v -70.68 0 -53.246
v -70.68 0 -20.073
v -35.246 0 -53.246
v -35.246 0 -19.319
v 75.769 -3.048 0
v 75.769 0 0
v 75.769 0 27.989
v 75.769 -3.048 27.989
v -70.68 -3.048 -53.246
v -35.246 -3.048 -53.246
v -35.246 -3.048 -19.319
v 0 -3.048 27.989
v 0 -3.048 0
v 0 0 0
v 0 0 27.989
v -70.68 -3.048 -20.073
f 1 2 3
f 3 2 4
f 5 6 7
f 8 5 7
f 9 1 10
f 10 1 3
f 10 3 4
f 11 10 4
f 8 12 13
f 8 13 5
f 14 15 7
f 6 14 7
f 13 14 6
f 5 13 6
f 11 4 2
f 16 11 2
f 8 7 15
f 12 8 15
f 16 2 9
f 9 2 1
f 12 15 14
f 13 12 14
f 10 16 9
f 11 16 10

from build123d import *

# Parameters (mm, degrees)
F0_W     = 37.884593
F0_H     = 13.994683
F0_H_2   = 13.994682
F1_DEPTH = 3.048
F3_DEPTH = 3.048


with BuildPart() as f1:
    # F0 (on Front) → F1 (new body)
    with BuildSketch(Plane.XZ):
        with Locations((18.942296, 6.997342)):
            Rectangle(F0_W, F0_H)
        with Locations((18.942296, 20.992024)):
            Rectangle(F0_W, F0_H_2)
        with Locations((56.826889, 6.997342)):
            Rectangle(F0_W, F0_H)
        with Locations((56.826889, 20.992024)):
            Rectangle(F0_W, F0_H_2)
    extrude(amount=F1_DEPTH)


with BuildPart() as f3:
    # F2 (on Front) → F3 (new body)
    with BuildSketch(Plane.XZ):
        Polygon((-35.245866, -19.319259), (-70.680216, -20.073181), (-70.680216, -53.245764), (-35.245866, -53.245764), align=None)
    extrude(amount=F3_DEPTH)


solid = Compound([f1.part, f3.part])
